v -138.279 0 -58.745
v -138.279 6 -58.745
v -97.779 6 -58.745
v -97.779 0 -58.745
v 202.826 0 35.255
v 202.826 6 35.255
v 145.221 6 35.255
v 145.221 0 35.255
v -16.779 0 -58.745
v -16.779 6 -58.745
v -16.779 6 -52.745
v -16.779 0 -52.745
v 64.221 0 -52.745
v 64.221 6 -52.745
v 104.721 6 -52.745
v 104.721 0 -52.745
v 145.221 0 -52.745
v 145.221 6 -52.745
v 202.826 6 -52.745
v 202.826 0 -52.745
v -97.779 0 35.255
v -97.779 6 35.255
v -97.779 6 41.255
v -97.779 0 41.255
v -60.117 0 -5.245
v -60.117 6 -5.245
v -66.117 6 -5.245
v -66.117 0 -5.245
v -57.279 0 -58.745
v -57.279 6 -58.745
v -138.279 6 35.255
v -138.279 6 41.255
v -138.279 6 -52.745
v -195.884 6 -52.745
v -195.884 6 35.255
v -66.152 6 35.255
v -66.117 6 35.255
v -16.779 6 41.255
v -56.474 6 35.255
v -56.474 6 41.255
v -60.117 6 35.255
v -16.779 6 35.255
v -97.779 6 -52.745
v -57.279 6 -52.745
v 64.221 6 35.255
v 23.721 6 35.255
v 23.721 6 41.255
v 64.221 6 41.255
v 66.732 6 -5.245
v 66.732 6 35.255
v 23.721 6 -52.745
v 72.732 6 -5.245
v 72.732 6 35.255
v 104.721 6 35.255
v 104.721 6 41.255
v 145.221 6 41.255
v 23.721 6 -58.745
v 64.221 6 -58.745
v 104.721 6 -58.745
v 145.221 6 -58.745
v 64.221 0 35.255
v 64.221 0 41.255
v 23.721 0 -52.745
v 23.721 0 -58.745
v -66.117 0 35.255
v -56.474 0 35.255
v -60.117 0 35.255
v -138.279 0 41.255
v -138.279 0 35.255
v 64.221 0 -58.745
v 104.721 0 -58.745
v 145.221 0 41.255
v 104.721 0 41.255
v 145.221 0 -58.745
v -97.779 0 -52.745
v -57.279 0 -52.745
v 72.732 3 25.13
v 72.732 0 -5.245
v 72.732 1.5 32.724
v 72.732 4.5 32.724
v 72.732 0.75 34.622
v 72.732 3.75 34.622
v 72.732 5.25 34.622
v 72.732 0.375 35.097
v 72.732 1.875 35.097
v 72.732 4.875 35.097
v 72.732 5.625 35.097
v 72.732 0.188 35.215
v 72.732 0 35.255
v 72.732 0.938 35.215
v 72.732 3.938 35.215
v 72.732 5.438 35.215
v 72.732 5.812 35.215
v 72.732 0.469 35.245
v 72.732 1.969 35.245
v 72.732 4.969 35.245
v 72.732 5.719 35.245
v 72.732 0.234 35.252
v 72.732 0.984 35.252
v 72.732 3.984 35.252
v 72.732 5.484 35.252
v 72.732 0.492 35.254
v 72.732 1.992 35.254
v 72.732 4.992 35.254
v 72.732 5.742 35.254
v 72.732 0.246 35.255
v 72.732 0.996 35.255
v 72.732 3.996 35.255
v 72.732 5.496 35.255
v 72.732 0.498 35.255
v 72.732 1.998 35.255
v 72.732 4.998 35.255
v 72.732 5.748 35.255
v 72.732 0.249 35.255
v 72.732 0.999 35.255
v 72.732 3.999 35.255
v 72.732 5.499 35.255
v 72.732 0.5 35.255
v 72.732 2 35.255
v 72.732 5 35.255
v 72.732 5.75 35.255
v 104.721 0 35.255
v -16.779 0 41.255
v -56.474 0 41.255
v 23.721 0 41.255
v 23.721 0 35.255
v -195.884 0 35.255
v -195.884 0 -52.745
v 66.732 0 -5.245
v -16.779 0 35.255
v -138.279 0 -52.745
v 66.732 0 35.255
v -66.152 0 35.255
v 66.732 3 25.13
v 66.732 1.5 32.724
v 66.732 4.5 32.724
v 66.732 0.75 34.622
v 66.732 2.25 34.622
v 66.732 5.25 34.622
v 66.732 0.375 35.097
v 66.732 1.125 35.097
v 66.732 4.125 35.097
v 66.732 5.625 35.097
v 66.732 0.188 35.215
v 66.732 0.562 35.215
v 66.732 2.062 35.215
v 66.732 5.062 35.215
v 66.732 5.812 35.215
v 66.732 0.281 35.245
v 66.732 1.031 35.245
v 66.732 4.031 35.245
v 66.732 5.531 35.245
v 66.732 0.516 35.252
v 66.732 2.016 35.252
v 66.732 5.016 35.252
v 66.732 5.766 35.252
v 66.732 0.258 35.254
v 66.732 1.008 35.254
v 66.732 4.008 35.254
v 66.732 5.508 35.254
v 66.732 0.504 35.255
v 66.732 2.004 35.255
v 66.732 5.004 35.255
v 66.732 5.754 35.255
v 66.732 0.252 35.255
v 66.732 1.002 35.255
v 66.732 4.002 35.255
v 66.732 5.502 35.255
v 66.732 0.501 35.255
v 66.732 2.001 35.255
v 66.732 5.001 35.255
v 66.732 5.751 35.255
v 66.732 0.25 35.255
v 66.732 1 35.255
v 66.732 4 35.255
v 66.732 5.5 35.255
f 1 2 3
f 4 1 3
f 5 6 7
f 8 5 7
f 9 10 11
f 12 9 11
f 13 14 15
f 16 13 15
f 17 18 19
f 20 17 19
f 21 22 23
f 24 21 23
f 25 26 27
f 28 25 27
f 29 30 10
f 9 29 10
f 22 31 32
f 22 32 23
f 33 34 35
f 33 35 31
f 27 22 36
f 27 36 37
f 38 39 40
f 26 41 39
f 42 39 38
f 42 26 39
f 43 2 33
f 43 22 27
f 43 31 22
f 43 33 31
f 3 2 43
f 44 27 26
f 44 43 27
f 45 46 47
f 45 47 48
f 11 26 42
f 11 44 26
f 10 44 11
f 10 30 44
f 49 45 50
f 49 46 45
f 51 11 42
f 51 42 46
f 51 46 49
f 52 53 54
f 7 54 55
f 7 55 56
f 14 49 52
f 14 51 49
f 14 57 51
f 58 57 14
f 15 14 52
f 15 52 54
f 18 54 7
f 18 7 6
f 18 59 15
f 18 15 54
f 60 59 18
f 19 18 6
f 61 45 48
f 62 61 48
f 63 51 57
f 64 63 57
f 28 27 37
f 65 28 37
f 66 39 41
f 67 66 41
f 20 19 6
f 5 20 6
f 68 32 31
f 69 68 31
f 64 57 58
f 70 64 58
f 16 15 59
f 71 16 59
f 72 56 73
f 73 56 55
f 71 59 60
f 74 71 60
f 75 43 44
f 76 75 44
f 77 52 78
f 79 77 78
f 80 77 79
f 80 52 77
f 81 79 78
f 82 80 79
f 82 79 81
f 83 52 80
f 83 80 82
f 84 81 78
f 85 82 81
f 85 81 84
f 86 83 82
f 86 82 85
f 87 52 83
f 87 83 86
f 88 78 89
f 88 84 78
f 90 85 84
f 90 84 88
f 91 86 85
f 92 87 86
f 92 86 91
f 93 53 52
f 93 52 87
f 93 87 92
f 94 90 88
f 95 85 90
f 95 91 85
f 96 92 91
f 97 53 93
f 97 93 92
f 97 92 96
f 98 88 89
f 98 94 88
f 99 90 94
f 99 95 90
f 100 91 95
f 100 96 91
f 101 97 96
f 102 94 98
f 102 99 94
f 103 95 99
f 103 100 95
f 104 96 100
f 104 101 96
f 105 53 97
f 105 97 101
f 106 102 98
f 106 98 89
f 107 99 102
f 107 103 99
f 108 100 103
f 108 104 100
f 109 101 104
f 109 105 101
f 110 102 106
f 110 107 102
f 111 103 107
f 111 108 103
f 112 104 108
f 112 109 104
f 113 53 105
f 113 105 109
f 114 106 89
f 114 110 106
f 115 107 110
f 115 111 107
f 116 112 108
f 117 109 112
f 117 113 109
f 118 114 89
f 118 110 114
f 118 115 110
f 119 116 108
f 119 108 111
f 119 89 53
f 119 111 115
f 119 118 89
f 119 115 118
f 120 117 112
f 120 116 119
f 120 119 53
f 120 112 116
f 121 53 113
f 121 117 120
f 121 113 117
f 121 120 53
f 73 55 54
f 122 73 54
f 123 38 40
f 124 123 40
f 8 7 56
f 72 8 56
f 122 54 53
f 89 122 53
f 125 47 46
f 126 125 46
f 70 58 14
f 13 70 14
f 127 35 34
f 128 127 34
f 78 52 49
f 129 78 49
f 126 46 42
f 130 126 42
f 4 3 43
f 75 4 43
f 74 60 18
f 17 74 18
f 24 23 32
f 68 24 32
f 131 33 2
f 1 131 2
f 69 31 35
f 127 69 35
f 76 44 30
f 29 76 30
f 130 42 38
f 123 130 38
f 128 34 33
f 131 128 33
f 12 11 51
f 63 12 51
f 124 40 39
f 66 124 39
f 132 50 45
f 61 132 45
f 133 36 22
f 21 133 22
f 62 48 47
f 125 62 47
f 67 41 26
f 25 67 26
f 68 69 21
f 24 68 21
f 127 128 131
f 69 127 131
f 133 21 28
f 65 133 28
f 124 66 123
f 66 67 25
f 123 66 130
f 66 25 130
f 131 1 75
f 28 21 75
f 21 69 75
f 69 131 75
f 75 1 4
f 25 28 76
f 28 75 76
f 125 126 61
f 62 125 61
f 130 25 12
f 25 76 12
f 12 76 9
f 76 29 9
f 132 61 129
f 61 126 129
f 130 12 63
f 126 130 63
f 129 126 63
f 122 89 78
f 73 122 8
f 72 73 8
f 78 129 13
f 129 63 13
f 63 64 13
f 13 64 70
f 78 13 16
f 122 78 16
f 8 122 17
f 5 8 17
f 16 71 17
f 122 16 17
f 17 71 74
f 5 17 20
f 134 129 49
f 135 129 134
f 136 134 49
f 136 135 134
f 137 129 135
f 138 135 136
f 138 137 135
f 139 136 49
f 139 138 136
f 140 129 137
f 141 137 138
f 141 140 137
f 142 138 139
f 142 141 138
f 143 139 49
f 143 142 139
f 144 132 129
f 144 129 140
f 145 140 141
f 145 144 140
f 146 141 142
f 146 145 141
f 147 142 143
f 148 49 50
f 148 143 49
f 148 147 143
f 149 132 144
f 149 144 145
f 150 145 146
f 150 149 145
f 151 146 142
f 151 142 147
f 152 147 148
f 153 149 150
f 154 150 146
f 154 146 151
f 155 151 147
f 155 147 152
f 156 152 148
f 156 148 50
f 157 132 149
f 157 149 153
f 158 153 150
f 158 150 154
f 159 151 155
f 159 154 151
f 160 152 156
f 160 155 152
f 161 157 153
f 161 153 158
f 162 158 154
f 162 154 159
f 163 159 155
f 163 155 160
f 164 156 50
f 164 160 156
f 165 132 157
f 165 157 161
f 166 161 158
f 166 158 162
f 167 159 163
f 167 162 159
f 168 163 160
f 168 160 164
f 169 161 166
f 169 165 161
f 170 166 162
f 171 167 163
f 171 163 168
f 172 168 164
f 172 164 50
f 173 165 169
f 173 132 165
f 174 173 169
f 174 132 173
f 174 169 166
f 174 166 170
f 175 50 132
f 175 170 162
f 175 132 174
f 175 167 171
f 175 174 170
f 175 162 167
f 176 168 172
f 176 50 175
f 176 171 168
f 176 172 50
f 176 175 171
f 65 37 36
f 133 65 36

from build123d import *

# Parameters (mm, degrees)
SKETCH1_W           = 500
SKETCH1_H           = 400
BOSS_EXTRUDE1_DEPTH = 6
SKETCH10_W          = 500
SKETCH10_H          = 400
CUT_EXTRUDE4_DEPTH  = 321.21242949


with BuildPart() as part:
    # Sketch1 → Boss-Extrude1 (new body)
    with BuildSketch(Plane(origin=(0, 0, 0), x_dir=(1, 0, 0), z_dir=(0, 1, 0))):
        Rectangle(SKETCH1_W, SKETCH1_H)
    extrude(amount=BOSS_EXTRUDE1_DEPTH)

    # Sketch10 → Cut-Extrude4 (cut, through all)
    with BuildSketch(Plane(origin=(0, 6, 0), x_dir=(1, 0, 0), z_dir=(0, 1, 0))):
        Rectangle(SKETCH10_W, SKETCH10_H)
        with BuildLine():
            Line((-56.474136069, -35.255089794), (-60.116609751, -35.255074272))
            Line((-60.116609751, -35.255074272), (-60.116609751, 5.244926844))
            Line((-60.116609751, 5.244926844), (-66.116640434, 5.244926844))
            Line((-66.116640434, 5.244926844), (-66.116640434, -35.255074272))
            Line((-66.116640434, -35.255074272), (-66.151890674, -35.25504815))
            Line((-66.151890674, -35.25504815), (-97.779213654, -35.254912055))
            Line((-97.779213654, -35.254912055), (-97.779213654, -41.25491222))
            Line((-97.779213654, -41.25491222), (-138.27921477, -41.25491222))
            Line((-138.27921477, -41.25491222), (-138.27921477, -35.254912055))
            Line((-138.27921477, -35.254912055), (-195.884196827, -35.254912055))
            Line((-195.884196827, -35.254912055), (-195.884196827, -11.505116755))
            Line((-195.884196827, -11.505116755), (-195.884196827, -11.5049114))
            Line((-195.884196827, -11.5049114), (-195.884196827, 28.994884362))
            Line((-195.884196827, 28.994884362), (-195.884196827, 28.995089716))
            Line((-195.884196827, 28.995089716), (-195.884196827, 52.745090371))
            Line((-195.884196827, 52.745090371), (-178.779215887, 52.745090371))
            Line((-178.779215887, 52.745090371), (-138.27921477, 52.745090371))
            Line((-138.27921477, 52.745090371), (-138.27921477, 58.745090537))
            Line((-138.27921477, 58.745090537), (-97.779213654, 58.745090537))
            Line((-97.779213654, 58.745090537), (-97.779213654, 52.745090371))
            Line((-97.779213654, 52.745090371), (-57.279212537, 52.745090371))
            Line((-57.279212537, 52.745090371), (-57.279212537, 58.745090537))
            Line((-57.279212537, 58.745090537), (-16.779211421, 58.745090537))
            Line((-16.779211421, 58.745090537), (-16.779211421, 52.745090371))
            Line((-16.779211421, 52.745090371), (23.720789695, 52.745090371))
            Line((23.720789695, 52.745090371), (23.720789695, 58.745090537))
            Line((23.720789695, 58.745090537), (64.220790812, 58.745090537))
            Line((64.220790812, 58.745090537), (64.220790812, 52.745090371))
            Line((64.220790812, 52.745090371), (104.720791928, 52.745090371))
            Line((104.720791928, 52.745090371), (104.720791928, 58.745090537))
            Line((104.720791928, 58.745090537), (145.220793045, 58.745090537))
            Line((145.220793045, 58.745090537), (145.220793045, 52.745090371))
            Line((145.220793045, 52.745090371), (202.825775101, 52.745090371))
            Line((202.825775101, 52.745090371), (202.825775101, 28.995089716))
            Line((202.825775101, 28.995089716), (202.825775101, -11.5049114))
            Line((202.825775101, -11.5049114), (202.825775101, -35.254912055))
            Line((202.825775101, -35.254912055), (185.720794161, -35.254912055))
            Line((185.720794161, -35.254912055), (145.220793045, -35.254912055))
            Line((145.220793045, -35.254912055), (145.220793045, -41.25491222))
            Line((145.220793045, -41.25491222), (104.720791928, -41.25491222))
            Line((104.720791928, -41.25491222), (104.720791928, -35.254912055))
            Line((104.720791928, -35.254912055), (72.732455527, -35.254912055))
            add(Edge.make_bspline(
                [(72.732455674, 5.244926844), (72.732455674, -35.255074272), (72.732455527, -35.254912055)],
                knots=[11, 11, 11, 12, 12, 12], degree=2))
            Line((72.732455674, 5.244926844), (66.732424991, 5.244926844))
            add(Edge.make_bspline(
                [(66.732427246, -35.254912055), (66.732424991, -35.255074272), (66.732424991, 5.244926844)],
                knots=[9, 9, 9, 10, 10, 10], degree=2))
            Line((66.732427246, -35.254912055), (64.220790812, -35.254912055))
            Line((64.220790812, -35.254912055), (64.220790812, -41.25491222))
            Line((64.220790812, -41.25491222), (23.720789695, -41.25491222))
            Line((23.720789695, -41.25491222), (23.720789695, -35.254912055))
            Line((23.720789695, -35.254912055), (-16.779211421, -35.254912055))
            Line((-16.779211421, -35.254912055), (-16.779211421, -41.25491222))
            Line((-16.779211421, -41.25491222), (-56.474136069, -41.25508996))
            Line((-56.474136069, -41.25508996), (-56.474136069, -35.255089794))
        make_face(mode=Mode.SUBTRACT)
    extrude(amount=-CUT_EXTRUDE4_DEPTH, mode=Mode.SUBTRACT)


solid = part.part
